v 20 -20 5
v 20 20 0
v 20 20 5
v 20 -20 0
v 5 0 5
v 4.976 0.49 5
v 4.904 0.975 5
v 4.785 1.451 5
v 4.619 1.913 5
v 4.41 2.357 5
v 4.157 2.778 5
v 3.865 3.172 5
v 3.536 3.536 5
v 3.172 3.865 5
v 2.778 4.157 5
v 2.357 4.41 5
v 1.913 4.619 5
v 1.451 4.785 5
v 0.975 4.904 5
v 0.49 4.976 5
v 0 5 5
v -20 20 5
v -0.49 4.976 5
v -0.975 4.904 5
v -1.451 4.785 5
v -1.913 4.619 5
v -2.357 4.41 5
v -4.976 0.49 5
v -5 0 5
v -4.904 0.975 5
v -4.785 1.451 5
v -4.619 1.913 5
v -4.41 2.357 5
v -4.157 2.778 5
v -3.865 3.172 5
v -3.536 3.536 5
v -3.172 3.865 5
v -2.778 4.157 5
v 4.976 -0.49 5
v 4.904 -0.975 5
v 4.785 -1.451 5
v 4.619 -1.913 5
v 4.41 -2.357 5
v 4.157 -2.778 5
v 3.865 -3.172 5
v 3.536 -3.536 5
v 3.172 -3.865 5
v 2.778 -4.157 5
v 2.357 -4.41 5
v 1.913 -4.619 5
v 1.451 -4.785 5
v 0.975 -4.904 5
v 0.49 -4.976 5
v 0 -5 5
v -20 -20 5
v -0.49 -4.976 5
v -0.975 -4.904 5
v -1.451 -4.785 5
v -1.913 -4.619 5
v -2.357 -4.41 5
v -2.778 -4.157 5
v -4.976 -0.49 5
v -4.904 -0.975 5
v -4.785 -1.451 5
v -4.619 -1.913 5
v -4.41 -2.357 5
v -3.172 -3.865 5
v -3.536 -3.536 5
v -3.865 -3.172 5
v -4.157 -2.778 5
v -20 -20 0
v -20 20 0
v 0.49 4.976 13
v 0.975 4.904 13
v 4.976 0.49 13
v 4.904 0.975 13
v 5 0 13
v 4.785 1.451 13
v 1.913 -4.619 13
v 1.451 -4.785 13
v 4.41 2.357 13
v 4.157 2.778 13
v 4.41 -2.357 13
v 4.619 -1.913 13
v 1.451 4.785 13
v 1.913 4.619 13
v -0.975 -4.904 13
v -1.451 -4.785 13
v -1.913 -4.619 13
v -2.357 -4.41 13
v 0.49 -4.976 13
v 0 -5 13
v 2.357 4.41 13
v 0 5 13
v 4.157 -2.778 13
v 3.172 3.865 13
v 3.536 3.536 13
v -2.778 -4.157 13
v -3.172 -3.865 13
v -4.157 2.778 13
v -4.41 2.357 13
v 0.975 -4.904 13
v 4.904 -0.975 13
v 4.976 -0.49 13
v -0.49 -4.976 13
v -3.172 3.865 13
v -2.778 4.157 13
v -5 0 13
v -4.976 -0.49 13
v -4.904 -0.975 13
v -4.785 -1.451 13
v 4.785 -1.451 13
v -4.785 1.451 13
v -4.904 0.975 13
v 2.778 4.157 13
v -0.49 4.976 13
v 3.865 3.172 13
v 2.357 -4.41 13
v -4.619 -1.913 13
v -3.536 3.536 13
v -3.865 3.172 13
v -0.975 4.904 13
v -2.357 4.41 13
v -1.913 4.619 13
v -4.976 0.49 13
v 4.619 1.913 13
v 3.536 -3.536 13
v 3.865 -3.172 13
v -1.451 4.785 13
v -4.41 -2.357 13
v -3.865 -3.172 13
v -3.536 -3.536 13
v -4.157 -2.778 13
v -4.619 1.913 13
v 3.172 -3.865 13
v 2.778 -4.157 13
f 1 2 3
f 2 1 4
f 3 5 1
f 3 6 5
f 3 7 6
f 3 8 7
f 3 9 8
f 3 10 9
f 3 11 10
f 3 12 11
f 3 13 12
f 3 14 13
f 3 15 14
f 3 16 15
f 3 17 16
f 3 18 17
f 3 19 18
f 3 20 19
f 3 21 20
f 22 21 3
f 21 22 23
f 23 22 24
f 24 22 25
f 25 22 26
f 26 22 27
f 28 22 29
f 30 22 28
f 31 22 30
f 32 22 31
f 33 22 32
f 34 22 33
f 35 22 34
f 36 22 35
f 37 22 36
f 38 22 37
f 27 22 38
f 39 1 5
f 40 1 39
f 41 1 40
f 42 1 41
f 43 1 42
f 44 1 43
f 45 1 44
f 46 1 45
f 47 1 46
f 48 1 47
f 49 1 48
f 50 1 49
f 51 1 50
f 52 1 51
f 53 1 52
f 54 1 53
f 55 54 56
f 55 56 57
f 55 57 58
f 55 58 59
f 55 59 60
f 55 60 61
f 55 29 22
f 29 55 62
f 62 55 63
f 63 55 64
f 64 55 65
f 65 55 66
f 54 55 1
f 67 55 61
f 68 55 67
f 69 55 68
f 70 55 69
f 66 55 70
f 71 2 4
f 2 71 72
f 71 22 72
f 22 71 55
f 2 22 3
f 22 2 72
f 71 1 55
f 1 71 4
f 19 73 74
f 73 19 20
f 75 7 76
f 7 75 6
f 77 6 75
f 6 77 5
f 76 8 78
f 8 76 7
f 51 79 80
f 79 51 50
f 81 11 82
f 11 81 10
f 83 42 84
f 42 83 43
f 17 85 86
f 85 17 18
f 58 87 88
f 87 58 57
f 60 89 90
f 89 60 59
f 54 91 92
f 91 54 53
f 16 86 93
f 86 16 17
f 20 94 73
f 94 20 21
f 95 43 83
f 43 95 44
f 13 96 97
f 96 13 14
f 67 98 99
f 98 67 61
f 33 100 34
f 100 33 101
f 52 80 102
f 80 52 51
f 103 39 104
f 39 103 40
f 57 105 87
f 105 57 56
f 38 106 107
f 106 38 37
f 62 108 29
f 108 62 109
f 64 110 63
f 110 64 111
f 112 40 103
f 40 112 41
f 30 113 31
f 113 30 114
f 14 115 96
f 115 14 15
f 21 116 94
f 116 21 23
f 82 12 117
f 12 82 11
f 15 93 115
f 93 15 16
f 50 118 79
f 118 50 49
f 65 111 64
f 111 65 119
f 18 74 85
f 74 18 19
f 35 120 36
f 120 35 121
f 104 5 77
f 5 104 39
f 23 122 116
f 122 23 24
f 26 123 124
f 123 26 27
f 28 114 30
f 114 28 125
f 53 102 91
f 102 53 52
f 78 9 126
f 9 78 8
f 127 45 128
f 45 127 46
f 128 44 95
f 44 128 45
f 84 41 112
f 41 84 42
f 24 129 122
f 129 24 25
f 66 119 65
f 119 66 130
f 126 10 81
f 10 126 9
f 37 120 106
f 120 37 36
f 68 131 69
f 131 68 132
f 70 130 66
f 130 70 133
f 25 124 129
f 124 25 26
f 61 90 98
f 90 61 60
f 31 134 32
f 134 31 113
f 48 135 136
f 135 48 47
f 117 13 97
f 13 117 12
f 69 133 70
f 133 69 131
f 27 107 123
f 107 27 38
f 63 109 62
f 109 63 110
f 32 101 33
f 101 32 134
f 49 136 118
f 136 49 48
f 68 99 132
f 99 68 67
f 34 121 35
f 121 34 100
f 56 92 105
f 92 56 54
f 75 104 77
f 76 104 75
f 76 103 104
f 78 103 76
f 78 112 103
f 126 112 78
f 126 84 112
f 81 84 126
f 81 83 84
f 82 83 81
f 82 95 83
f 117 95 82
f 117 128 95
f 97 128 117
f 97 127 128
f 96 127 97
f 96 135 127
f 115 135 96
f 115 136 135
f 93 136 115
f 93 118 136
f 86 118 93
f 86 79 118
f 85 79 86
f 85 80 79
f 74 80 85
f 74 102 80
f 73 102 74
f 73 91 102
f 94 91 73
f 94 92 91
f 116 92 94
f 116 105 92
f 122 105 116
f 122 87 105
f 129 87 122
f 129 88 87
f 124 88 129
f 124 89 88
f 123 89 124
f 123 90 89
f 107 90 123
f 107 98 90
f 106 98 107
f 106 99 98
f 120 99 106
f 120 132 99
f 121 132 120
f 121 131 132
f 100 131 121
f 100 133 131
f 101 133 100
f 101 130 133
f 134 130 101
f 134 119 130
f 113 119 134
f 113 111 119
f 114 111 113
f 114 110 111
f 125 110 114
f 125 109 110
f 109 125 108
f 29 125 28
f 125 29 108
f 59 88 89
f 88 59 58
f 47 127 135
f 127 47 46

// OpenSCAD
// Plate 40x40x5 centred in XY, sitting on Z=0; boss d10, 8 mm tall on top.
$fn=64;
union(){
  translate([-20,-20,0]) cube([40,40,5]);
  translate([0,0,4.99]) cylinder(d=10,h=8.01); // slight overlap, top at Z=13
}
